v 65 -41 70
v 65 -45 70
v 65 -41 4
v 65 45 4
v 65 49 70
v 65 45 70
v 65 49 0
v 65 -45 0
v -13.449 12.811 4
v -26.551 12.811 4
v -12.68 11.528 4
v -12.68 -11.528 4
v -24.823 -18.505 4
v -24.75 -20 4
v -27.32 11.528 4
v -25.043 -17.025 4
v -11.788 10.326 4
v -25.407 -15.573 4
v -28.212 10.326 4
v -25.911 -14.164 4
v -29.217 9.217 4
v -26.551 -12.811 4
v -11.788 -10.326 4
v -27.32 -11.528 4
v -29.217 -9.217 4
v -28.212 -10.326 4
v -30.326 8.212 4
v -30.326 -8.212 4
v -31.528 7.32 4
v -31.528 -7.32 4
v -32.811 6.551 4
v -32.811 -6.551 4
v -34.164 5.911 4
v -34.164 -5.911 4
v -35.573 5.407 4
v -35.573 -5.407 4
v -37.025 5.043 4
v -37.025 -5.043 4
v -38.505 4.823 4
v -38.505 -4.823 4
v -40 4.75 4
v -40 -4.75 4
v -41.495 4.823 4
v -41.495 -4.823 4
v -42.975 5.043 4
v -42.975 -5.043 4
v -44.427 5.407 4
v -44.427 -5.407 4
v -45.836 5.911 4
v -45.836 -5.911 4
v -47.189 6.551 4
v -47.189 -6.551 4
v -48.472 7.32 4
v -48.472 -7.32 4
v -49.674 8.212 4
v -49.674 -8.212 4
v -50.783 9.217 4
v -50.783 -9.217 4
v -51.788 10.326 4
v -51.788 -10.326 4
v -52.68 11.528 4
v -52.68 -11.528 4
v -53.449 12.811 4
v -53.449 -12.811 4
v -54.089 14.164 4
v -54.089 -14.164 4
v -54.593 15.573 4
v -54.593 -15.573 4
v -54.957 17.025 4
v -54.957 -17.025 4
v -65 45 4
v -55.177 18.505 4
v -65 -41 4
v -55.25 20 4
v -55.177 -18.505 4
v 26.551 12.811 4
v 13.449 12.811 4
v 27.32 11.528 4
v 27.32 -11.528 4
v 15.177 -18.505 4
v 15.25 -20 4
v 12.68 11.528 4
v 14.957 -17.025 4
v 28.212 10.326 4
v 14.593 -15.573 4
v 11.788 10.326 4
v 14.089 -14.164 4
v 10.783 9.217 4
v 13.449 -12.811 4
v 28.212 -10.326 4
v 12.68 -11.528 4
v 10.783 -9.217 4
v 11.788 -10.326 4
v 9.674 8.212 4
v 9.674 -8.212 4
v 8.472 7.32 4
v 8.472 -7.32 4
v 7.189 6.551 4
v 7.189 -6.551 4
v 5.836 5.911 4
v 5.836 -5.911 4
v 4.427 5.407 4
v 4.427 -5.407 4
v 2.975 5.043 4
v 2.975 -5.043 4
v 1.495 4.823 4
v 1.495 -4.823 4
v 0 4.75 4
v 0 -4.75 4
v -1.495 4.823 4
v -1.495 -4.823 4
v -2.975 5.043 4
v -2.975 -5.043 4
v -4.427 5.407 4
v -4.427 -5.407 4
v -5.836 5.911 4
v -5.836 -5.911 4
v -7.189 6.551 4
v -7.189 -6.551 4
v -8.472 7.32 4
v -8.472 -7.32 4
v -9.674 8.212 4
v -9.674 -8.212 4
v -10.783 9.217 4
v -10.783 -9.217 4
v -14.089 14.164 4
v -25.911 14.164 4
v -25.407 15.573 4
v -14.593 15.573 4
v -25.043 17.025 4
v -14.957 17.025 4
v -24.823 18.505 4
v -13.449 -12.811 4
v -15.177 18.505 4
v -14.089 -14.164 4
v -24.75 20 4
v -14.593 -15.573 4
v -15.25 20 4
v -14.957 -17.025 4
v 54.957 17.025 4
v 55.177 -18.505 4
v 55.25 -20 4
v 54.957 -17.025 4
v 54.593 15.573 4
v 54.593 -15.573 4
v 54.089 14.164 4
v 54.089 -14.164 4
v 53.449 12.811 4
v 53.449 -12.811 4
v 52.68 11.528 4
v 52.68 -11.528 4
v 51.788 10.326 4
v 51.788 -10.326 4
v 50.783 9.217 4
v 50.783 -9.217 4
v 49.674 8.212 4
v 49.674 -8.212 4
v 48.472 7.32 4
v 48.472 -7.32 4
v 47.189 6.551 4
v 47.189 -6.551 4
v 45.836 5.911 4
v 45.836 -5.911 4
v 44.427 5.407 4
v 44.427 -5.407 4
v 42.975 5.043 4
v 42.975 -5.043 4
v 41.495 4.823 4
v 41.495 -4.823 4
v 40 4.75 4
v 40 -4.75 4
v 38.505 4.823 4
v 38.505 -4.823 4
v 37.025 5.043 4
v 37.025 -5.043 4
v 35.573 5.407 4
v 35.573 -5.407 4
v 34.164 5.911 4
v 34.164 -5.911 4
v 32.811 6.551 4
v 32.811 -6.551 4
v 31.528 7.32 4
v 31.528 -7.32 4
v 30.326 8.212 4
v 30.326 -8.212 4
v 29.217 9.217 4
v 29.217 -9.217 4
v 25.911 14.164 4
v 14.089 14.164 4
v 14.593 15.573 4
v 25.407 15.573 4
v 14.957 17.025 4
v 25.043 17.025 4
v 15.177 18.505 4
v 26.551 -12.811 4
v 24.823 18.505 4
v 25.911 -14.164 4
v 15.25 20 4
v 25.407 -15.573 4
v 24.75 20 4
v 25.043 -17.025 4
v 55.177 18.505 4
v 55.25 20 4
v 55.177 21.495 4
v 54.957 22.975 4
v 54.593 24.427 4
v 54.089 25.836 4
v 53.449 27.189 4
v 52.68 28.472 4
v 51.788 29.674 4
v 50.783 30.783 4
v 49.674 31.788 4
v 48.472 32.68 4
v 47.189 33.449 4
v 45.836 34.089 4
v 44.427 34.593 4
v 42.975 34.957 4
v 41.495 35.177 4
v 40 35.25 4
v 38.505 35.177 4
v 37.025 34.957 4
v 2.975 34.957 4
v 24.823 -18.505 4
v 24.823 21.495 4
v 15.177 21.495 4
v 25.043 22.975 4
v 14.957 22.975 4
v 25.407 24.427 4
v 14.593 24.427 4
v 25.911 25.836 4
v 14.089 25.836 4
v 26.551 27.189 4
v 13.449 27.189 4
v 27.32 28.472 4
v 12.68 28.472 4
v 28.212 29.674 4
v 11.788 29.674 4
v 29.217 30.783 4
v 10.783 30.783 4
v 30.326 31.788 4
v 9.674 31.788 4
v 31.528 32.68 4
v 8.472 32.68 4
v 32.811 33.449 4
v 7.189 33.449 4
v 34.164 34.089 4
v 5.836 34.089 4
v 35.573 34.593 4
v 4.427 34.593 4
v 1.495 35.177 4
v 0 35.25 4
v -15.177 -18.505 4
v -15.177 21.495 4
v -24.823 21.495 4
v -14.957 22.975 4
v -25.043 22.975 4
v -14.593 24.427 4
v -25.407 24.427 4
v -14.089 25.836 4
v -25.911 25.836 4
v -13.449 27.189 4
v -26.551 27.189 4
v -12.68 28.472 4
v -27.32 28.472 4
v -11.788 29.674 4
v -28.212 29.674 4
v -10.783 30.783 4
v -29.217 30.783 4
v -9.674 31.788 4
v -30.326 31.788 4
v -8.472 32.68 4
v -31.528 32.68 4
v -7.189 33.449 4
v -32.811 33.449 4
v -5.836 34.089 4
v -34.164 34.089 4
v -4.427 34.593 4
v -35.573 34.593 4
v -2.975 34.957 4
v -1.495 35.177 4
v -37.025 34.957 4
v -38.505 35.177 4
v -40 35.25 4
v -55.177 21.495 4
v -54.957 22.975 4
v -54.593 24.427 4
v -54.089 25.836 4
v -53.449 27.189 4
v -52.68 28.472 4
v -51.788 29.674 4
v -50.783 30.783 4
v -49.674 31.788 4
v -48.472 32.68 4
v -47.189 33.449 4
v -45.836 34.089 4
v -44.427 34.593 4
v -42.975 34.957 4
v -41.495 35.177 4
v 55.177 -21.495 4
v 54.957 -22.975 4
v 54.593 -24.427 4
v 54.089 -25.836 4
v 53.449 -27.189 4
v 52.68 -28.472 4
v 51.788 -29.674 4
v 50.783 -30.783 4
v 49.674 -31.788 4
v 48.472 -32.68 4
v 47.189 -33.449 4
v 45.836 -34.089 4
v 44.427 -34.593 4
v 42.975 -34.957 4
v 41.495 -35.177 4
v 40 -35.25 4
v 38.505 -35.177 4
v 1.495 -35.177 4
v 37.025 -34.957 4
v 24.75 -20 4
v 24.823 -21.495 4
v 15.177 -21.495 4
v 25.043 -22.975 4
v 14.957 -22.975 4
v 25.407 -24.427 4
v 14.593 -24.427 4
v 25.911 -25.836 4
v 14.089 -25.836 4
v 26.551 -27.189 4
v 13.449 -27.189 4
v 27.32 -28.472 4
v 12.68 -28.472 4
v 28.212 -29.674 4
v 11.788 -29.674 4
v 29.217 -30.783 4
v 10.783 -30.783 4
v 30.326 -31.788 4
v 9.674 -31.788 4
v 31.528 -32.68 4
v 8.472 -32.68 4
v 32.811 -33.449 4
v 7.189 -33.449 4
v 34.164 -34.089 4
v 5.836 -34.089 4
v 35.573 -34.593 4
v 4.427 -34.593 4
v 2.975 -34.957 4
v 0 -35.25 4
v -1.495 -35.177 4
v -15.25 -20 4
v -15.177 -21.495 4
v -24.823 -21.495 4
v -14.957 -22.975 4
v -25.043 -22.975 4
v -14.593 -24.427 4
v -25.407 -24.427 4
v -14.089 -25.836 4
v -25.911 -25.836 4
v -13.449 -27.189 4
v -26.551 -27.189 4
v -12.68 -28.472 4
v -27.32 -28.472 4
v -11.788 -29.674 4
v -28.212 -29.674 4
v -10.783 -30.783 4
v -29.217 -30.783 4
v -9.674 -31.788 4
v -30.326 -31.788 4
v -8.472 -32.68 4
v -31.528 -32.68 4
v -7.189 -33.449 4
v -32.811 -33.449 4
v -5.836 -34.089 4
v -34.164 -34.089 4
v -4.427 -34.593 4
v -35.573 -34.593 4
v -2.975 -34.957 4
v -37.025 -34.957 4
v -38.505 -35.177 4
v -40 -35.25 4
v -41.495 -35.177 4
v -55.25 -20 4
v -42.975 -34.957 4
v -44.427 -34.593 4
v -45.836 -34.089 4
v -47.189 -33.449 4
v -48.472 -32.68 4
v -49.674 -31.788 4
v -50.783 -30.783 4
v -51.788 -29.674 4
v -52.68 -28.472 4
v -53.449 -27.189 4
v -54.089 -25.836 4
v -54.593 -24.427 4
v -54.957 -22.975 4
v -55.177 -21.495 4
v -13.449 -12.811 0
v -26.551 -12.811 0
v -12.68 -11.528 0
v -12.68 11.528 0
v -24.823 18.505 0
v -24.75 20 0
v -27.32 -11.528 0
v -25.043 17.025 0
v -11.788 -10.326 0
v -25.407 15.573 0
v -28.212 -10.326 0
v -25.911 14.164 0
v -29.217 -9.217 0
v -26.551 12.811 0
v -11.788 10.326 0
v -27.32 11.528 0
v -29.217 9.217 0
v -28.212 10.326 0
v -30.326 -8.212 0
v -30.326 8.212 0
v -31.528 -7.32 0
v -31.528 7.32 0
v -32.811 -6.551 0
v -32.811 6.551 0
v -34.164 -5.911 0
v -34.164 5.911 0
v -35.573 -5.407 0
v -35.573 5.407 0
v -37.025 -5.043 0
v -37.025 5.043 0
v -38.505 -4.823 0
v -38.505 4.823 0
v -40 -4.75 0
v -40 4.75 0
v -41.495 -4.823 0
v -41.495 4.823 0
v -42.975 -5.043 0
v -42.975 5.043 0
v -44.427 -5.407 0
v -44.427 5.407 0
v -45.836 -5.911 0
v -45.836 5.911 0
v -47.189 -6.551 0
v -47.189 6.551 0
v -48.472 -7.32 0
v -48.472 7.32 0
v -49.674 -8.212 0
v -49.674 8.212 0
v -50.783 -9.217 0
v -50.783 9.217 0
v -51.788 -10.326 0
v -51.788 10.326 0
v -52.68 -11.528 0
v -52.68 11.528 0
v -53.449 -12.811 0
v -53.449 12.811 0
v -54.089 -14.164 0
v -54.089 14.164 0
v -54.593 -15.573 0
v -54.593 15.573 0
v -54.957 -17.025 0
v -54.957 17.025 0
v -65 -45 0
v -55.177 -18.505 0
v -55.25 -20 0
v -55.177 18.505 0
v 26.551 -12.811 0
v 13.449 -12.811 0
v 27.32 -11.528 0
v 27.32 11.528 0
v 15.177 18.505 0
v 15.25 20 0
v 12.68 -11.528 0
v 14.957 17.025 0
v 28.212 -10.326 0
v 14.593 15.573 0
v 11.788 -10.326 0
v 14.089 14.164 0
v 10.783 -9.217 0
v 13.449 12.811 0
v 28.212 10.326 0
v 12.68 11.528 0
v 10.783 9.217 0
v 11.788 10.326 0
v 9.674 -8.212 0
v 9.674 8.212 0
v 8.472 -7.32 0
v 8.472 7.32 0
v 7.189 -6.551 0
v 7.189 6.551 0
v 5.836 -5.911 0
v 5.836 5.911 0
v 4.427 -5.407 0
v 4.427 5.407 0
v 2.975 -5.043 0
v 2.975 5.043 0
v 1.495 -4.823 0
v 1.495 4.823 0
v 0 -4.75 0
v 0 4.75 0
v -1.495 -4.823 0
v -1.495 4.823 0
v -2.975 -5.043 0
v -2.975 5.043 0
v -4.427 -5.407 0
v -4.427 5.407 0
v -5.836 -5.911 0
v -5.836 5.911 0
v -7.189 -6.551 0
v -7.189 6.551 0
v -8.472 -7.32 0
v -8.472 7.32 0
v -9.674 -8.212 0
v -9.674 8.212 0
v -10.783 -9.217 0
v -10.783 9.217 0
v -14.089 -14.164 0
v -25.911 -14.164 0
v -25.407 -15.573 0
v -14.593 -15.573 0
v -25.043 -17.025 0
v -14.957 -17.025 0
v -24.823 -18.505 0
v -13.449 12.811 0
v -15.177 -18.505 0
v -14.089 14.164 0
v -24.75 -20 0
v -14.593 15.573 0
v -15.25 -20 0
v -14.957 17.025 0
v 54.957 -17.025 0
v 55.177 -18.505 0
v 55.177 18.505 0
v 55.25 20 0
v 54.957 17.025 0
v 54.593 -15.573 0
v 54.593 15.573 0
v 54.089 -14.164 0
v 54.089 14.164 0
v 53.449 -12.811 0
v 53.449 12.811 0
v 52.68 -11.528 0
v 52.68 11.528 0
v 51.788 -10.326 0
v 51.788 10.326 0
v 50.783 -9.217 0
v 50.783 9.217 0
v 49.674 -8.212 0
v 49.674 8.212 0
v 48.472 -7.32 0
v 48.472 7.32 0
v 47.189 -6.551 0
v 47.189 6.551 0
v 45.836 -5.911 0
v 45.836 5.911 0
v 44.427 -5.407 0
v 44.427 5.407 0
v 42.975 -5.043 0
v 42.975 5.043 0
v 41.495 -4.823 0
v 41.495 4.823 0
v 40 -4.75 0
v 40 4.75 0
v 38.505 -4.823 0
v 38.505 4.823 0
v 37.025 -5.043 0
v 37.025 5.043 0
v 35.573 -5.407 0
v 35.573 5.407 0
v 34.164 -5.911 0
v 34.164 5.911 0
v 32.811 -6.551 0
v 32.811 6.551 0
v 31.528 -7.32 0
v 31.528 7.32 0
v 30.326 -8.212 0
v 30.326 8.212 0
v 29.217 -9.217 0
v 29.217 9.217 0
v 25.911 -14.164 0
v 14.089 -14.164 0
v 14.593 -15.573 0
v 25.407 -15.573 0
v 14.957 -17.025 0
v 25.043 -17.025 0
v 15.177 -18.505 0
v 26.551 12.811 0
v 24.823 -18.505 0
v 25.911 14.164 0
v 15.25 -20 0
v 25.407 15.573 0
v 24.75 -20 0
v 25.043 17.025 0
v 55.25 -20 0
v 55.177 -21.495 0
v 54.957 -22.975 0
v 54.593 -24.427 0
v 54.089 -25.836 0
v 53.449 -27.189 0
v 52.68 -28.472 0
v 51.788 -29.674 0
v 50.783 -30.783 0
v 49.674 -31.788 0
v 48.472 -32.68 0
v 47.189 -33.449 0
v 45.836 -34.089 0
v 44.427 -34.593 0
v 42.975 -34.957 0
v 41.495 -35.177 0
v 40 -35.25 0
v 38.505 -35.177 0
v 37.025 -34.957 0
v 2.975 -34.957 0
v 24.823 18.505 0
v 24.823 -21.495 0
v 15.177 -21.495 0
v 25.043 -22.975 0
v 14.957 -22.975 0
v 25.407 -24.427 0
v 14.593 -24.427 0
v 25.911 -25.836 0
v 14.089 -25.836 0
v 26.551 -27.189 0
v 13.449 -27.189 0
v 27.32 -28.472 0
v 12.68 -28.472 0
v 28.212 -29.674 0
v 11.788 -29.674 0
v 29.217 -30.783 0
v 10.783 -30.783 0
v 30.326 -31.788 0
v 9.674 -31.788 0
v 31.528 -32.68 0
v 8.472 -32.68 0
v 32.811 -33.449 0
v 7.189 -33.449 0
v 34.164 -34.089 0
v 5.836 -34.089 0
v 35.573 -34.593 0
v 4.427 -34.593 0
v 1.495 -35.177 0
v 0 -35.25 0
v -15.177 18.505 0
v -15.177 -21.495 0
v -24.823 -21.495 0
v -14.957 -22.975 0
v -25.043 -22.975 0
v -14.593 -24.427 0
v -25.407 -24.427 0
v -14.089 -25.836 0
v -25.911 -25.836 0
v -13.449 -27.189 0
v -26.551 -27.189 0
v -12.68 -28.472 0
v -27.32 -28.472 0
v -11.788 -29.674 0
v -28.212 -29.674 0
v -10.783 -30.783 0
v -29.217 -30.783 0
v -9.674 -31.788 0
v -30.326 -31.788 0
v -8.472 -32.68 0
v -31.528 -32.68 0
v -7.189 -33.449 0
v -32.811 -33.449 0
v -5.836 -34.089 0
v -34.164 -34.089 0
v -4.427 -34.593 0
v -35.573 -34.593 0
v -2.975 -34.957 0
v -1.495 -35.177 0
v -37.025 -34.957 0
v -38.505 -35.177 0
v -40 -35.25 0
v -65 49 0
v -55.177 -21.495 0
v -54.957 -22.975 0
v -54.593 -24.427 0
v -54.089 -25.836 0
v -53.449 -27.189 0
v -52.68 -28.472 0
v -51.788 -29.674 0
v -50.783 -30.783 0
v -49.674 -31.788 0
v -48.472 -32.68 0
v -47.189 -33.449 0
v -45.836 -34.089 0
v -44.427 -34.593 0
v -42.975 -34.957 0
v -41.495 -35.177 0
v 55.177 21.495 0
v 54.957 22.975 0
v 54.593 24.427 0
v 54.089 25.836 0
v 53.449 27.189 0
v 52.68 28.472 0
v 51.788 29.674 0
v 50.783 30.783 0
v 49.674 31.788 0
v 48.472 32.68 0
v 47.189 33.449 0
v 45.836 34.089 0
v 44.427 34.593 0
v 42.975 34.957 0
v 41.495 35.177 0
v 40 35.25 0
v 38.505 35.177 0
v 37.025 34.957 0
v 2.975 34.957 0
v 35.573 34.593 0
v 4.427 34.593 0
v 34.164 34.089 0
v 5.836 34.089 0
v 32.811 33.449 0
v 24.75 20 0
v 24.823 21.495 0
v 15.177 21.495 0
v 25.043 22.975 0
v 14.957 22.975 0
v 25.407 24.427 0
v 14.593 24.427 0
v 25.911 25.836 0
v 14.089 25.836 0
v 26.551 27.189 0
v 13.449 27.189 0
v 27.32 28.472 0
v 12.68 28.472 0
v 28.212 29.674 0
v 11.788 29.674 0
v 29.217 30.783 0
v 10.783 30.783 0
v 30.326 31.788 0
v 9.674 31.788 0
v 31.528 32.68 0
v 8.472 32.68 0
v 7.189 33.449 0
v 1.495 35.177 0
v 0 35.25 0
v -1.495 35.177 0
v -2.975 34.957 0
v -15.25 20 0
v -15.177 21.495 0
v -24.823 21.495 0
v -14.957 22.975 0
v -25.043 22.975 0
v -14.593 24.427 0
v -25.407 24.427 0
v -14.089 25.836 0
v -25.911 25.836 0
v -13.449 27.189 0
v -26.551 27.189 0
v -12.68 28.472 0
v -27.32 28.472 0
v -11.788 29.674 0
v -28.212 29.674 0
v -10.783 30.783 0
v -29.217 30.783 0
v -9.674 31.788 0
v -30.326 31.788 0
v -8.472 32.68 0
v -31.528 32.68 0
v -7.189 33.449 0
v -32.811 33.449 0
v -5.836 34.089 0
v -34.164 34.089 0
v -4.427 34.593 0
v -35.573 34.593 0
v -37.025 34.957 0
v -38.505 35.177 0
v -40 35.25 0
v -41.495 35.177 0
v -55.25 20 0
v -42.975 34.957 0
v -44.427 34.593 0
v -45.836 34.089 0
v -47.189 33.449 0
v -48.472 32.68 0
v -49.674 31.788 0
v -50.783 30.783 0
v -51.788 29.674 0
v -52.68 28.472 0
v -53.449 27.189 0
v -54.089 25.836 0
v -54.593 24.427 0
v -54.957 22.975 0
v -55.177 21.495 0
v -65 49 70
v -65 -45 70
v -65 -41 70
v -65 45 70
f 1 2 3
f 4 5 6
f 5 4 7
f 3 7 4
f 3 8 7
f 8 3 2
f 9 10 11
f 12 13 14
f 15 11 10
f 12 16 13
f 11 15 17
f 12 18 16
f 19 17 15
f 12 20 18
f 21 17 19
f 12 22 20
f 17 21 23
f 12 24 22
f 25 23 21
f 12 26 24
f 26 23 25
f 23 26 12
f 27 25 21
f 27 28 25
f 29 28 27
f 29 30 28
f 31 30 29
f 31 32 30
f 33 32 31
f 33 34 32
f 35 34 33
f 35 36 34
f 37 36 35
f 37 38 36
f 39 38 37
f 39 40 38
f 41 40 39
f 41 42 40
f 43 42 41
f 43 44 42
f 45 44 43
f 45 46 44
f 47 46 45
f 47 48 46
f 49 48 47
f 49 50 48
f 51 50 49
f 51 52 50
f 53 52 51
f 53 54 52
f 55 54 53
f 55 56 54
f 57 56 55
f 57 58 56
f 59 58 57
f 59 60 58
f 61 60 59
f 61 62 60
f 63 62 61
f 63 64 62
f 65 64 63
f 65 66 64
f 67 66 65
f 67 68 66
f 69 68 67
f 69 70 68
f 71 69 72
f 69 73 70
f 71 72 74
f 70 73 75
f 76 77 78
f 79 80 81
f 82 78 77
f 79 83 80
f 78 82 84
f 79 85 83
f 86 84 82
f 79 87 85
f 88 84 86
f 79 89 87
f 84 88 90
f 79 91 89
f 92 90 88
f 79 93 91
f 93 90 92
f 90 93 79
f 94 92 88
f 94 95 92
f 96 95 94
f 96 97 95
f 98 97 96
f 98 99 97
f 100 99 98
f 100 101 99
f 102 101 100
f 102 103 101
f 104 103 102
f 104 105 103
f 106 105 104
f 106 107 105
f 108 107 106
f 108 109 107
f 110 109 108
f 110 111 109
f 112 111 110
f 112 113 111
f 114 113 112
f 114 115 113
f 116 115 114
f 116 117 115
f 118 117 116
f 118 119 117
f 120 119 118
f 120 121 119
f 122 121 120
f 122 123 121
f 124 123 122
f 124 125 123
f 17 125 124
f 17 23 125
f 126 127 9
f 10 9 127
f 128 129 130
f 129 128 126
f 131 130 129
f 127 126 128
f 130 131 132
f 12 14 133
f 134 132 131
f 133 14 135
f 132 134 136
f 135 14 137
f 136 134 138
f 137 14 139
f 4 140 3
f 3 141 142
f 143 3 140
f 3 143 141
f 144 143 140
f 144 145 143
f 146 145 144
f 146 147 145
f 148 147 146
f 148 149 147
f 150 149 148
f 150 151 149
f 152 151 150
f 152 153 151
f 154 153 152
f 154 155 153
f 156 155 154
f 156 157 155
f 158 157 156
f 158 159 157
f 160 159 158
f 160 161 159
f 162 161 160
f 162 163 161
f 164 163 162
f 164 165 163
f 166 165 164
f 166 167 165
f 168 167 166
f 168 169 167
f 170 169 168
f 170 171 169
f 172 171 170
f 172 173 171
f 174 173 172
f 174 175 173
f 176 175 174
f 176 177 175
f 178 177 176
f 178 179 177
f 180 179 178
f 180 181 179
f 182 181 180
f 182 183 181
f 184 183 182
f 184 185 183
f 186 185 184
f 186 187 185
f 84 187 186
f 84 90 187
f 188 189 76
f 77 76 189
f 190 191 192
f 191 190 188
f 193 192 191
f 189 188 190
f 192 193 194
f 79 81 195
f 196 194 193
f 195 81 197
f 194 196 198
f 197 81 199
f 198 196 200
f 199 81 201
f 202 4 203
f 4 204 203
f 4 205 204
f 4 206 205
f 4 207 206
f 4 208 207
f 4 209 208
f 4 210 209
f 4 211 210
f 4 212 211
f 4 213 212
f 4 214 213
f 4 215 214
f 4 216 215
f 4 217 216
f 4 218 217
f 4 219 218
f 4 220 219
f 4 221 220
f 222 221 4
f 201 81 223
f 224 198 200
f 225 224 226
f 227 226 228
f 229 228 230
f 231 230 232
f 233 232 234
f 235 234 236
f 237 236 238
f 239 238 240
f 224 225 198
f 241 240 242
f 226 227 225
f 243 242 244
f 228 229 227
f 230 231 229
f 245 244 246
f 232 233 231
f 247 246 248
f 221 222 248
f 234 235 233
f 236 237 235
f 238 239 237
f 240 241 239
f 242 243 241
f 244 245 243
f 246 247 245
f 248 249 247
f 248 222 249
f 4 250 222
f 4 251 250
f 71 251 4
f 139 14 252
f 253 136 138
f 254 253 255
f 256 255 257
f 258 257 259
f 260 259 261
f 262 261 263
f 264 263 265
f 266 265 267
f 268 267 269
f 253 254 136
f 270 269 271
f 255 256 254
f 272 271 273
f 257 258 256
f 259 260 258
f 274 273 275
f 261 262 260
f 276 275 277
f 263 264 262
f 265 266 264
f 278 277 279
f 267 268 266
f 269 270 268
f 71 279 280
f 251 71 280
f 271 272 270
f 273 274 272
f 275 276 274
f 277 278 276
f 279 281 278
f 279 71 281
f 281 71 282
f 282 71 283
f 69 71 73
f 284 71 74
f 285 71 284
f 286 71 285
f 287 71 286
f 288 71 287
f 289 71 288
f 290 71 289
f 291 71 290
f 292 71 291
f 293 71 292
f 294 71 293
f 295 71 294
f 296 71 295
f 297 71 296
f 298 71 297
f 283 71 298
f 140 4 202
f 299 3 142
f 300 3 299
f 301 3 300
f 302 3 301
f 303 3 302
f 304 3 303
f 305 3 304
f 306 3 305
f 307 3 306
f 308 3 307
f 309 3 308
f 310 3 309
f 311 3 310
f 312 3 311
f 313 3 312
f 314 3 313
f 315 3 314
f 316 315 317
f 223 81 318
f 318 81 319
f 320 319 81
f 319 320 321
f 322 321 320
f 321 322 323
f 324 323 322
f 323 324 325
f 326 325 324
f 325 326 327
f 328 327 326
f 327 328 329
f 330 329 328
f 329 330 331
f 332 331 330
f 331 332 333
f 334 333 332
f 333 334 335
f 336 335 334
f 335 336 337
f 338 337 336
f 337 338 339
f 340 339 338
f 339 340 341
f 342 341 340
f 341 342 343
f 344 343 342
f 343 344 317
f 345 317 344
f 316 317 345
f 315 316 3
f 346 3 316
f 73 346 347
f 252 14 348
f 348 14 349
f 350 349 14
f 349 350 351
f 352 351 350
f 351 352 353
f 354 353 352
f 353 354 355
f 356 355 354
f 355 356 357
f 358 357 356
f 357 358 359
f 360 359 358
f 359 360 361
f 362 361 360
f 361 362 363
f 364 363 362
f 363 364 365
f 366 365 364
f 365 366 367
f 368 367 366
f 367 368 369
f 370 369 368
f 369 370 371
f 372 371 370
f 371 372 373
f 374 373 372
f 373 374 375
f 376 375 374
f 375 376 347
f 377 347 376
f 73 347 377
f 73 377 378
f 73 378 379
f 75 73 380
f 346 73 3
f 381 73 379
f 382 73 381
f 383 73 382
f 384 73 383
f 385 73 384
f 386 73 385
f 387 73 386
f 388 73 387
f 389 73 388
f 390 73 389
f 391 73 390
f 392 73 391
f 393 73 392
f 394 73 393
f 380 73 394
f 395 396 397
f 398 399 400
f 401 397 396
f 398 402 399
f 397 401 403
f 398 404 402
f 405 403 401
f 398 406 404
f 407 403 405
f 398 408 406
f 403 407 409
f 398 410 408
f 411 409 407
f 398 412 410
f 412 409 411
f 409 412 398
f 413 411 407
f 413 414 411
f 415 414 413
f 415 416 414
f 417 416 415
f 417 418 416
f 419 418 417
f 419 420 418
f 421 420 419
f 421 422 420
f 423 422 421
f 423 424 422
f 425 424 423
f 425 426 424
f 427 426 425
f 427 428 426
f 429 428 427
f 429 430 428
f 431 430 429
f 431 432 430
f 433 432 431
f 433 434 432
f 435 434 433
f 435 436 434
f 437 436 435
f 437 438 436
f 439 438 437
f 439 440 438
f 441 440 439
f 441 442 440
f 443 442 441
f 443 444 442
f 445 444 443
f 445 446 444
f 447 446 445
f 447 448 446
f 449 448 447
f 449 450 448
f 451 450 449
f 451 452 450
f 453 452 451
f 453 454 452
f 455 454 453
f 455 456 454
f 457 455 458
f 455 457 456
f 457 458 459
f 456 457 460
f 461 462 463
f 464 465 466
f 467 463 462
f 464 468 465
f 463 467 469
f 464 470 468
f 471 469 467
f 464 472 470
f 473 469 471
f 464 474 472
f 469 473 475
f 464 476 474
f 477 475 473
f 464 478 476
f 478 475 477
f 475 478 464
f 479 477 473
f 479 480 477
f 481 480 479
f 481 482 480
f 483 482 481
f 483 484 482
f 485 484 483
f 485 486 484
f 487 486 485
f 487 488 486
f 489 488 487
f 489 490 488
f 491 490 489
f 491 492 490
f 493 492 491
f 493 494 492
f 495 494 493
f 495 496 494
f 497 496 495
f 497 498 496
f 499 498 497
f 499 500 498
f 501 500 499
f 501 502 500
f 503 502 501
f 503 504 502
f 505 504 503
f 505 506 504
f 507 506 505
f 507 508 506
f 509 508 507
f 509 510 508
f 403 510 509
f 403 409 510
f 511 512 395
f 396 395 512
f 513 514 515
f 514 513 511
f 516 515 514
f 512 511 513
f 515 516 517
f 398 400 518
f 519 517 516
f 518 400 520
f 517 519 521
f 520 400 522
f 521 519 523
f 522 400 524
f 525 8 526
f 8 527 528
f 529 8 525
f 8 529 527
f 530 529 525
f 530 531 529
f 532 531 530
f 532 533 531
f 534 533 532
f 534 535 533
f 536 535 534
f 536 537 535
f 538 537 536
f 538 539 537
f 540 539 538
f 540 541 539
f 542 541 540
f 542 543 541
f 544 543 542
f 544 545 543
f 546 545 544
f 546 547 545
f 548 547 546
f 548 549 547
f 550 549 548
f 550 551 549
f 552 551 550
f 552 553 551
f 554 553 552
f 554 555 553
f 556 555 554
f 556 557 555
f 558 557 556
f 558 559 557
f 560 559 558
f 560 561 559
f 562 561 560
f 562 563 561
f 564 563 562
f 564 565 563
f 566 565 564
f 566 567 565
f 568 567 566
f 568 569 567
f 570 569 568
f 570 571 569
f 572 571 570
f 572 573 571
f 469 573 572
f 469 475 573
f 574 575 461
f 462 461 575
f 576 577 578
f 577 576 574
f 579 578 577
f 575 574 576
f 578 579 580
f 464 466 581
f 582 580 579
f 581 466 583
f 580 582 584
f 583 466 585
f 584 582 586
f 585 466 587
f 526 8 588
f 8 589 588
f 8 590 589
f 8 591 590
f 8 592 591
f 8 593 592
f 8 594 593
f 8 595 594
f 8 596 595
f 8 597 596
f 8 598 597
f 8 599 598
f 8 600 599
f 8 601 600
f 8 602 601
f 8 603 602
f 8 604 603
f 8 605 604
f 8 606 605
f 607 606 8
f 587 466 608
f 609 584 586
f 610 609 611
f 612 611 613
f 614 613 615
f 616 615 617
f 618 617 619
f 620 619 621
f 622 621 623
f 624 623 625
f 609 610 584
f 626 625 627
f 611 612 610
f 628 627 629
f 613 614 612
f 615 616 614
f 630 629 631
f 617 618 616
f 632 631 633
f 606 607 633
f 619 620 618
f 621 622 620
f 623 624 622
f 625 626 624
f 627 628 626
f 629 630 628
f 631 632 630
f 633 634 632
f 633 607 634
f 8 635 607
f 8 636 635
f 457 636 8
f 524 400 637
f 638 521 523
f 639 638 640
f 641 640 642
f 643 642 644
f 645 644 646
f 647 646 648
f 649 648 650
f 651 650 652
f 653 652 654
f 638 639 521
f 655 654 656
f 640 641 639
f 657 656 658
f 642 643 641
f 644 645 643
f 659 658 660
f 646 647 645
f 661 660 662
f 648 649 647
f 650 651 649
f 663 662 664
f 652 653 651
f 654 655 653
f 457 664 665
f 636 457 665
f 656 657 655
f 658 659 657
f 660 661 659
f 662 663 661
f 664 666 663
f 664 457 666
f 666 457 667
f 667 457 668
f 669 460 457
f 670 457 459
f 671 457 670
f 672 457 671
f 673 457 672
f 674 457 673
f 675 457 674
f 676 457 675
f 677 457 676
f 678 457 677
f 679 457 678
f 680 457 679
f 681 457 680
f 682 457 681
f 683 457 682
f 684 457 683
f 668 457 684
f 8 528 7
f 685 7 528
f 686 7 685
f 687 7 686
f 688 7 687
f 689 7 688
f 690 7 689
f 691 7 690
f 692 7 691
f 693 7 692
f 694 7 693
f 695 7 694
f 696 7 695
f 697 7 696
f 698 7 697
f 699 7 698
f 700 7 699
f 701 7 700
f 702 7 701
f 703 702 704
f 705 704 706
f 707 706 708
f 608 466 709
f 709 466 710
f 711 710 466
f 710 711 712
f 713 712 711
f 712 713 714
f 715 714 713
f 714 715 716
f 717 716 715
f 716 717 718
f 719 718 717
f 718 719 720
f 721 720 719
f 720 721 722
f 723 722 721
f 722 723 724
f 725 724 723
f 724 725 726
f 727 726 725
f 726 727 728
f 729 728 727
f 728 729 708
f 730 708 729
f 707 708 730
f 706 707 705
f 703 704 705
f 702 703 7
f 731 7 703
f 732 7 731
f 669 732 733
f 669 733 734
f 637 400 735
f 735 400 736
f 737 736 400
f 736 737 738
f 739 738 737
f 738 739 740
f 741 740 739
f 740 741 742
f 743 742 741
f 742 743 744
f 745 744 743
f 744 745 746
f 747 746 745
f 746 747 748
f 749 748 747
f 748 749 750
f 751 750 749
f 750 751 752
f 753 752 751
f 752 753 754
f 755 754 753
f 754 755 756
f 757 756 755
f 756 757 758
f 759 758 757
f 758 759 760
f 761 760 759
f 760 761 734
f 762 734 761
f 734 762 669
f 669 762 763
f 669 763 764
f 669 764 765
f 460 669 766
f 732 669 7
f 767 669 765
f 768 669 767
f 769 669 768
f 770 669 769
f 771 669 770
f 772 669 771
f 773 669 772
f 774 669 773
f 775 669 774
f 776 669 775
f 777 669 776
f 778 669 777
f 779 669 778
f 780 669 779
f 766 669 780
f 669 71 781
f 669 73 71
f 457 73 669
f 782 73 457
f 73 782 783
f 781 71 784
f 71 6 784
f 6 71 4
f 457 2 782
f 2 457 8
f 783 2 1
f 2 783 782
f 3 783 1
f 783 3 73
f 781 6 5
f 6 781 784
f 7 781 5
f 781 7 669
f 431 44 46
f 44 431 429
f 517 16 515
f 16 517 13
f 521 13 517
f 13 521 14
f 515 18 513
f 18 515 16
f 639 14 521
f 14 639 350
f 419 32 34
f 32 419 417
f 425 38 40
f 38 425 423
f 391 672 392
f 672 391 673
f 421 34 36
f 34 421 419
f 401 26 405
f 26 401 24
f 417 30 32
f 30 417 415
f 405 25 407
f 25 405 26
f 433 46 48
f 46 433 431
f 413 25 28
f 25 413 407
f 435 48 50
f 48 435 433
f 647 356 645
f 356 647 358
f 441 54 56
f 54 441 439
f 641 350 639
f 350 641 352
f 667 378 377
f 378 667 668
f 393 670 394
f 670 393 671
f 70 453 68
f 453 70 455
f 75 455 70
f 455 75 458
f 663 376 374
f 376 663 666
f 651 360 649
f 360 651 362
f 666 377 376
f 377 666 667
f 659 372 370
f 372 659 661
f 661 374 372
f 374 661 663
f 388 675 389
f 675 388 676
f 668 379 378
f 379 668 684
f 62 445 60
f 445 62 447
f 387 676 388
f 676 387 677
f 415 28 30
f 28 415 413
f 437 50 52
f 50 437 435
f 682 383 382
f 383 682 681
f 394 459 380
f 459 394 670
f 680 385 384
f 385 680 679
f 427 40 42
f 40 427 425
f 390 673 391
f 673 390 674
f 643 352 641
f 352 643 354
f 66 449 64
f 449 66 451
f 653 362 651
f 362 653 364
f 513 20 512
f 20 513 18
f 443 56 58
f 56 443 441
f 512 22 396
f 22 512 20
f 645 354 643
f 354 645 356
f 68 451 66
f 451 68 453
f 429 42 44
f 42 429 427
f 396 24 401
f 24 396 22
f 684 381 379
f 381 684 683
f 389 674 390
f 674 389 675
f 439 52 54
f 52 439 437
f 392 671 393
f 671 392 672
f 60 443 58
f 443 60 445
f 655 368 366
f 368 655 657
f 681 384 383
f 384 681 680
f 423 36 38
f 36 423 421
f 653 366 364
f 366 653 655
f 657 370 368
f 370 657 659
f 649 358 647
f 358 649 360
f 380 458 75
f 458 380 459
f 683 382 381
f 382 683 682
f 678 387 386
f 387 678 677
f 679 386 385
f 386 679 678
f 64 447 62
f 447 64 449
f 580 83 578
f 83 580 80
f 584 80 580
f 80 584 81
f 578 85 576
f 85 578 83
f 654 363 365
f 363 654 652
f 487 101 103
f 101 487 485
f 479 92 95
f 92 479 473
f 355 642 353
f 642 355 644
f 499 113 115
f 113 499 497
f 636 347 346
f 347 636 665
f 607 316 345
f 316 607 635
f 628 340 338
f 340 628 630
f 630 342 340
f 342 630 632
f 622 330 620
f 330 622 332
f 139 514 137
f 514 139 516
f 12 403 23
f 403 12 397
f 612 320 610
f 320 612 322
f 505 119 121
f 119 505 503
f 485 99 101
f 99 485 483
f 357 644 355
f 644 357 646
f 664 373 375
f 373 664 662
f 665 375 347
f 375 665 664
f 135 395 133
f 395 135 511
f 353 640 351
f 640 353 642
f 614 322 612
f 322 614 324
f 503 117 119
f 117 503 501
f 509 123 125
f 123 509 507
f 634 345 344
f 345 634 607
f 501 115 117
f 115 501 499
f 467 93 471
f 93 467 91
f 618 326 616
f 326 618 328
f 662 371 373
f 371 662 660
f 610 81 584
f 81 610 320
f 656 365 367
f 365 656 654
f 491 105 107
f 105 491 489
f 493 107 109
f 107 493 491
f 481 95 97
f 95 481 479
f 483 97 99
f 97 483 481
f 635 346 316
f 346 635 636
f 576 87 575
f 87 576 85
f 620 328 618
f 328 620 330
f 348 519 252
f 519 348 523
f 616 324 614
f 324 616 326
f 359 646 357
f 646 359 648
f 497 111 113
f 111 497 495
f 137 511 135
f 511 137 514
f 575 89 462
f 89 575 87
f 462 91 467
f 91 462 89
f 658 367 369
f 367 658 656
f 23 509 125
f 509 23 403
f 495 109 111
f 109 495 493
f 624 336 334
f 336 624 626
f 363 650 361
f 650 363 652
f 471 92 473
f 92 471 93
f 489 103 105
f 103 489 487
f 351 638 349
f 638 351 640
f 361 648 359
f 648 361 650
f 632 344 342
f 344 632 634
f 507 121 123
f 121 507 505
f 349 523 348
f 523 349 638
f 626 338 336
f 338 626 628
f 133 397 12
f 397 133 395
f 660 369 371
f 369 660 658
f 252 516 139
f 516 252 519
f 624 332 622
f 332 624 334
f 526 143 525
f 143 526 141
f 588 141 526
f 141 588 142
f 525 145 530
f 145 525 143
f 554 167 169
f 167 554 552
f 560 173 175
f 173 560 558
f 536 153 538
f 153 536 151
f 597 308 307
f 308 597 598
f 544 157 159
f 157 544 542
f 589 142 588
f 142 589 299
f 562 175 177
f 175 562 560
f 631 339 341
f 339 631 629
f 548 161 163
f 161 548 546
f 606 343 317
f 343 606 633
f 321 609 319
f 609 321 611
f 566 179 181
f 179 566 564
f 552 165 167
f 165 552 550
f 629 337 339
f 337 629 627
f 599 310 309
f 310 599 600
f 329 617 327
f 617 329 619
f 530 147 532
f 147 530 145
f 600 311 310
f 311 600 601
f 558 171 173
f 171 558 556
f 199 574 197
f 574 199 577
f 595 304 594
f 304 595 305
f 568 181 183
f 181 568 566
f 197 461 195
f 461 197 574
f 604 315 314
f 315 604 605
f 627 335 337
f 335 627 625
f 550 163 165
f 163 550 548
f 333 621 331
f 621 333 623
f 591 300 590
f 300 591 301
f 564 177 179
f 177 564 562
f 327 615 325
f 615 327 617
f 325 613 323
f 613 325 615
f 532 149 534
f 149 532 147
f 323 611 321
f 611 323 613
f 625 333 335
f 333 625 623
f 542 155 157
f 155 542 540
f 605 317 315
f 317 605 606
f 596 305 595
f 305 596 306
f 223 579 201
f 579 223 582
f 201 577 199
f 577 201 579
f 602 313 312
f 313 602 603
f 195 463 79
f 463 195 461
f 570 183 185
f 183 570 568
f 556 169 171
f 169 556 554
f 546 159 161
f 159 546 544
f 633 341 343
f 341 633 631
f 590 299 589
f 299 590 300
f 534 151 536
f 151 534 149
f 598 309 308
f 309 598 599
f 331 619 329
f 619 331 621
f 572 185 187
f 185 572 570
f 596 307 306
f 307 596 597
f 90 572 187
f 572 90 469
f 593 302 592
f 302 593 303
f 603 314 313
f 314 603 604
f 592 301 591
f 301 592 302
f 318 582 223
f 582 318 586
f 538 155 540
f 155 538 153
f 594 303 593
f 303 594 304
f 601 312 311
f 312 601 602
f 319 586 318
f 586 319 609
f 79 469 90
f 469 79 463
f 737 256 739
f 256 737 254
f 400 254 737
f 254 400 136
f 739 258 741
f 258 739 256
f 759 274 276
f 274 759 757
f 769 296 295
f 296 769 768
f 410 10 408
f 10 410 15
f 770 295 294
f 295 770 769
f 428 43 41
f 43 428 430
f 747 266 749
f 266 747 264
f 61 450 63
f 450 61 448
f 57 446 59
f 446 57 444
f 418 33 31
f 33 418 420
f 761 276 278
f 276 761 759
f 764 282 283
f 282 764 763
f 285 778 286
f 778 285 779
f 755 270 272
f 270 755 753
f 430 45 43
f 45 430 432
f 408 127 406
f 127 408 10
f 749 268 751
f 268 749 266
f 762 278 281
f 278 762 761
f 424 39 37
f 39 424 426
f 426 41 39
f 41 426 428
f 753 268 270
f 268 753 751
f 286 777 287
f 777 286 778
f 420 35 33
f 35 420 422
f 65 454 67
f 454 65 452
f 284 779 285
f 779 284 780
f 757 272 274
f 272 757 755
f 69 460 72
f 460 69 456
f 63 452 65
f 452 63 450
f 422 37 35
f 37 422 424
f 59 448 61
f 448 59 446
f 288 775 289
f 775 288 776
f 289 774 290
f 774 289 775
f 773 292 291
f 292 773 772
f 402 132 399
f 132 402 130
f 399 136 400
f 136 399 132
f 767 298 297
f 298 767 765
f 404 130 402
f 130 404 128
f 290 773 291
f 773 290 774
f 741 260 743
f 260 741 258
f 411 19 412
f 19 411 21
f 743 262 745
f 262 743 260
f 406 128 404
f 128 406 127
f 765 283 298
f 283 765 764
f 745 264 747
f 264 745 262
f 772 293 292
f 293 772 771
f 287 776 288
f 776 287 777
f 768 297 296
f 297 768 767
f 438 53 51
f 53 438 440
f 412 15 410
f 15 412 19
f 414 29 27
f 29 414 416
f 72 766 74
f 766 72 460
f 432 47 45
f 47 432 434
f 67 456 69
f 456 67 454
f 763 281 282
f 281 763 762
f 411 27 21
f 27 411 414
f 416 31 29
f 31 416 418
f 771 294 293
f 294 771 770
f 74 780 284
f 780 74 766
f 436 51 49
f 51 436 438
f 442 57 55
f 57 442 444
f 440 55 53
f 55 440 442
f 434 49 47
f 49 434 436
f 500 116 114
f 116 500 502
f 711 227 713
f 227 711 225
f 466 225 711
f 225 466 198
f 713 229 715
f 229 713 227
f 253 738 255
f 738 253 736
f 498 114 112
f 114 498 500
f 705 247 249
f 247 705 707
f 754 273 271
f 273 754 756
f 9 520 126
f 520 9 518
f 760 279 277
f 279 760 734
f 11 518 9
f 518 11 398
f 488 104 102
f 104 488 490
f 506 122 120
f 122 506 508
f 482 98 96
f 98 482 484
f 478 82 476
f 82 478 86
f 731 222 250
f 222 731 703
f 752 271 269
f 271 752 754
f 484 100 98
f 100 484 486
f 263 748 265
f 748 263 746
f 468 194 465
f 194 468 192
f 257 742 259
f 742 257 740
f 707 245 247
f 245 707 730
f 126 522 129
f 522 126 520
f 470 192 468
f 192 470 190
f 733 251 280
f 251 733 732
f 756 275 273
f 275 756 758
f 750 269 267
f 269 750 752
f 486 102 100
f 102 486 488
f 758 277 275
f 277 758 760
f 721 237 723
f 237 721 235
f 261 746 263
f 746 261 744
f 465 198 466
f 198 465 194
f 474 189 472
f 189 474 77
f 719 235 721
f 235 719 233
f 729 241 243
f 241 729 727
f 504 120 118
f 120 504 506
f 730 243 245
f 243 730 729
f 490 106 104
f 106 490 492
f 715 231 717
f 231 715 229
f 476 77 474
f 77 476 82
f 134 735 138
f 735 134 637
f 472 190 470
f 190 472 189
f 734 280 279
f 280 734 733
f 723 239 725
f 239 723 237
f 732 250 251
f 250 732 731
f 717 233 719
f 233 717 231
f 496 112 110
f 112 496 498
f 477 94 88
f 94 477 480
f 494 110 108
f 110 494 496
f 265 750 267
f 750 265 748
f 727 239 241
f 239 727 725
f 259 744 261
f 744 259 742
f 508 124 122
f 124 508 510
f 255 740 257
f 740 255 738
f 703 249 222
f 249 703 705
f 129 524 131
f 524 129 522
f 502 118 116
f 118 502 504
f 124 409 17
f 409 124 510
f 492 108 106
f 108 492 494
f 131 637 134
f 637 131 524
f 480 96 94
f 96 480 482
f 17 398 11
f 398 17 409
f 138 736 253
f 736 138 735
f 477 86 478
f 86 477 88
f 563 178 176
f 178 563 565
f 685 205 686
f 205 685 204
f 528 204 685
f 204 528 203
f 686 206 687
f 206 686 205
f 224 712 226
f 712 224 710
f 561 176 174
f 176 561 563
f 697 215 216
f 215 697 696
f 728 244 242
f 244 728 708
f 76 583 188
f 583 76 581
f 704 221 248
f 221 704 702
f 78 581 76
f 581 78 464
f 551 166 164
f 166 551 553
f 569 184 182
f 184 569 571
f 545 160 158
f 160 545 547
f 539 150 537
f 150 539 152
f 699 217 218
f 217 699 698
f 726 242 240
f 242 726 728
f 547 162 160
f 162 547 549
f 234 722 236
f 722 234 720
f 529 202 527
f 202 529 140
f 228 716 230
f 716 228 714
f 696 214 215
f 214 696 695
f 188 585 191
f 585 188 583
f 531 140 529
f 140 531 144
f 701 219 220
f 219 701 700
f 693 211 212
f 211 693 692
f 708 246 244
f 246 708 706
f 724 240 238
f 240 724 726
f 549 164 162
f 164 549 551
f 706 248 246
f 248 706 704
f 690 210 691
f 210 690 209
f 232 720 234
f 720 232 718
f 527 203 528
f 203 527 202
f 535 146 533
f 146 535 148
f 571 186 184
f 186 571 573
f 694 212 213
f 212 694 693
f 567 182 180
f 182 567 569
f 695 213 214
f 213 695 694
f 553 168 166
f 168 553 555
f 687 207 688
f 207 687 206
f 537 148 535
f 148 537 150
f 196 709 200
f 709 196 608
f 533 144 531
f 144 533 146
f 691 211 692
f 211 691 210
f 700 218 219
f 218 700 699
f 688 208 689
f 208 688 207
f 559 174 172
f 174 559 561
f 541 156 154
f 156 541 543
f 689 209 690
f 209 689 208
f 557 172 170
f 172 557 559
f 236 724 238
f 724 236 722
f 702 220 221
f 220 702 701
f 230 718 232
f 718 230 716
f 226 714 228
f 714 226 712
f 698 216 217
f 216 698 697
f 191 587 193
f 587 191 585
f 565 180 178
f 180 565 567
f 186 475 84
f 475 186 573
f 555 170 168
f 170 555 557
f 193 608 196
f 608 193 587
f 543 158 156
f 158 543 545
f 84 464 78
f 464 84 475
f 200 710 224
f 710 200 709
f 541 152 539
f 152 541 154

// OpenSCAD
// Rack for six 50 mL conical (Falcon-type) tubes.
// Print orientation: Flat plate on bed (z=0), walls rising to z=70.
// After printing, flip over so walls are on the bed and tubes hang down.

// Plate dimensions
L     = 130; // Length (X)
W     = 90;  // Width (Y)
t_plate = 4; // Plate thickness (Z)

// Tube hole dimensions
n_rows = 2; // Rows along Y
n_cols = 3; // Columns along X
d_hole = 30.5; // Hole diameter
p_x = 40; // Centre-to-centre spacing X
p_y = 40; // Centre-to-centre spacing Y

// Wall dimensions
wall_h = 70; // Wall height (Z)
wall_t = 4;  // Wall thickness (Y)

// Geometry calculations
// Plate is centred on origin, so edges are at +/- L/2 and +/- W/2.
// Holes are centred on plate.
// Rows are along Y, Columns along X.
// Spacing is 40mm. With 2 rows, distance from centre is 20mm.
// With 3 cols, positions are -40, 0, +40.

$fn = 64;

// Calculate hole positions manually to avoid list comprehension syntax errors
// X positions: -40, 0, 40
hole_x_0 = -40;
hole_x_1 = 0;
hole_x_2 = 40;

// Y positions: -20, 20
hole_y_0 = -20;
hole_y_1 = 20;

difference() {
    union() {
        // 1. The flat base plate
        translate([-L / 2, -W / 2, 0]) cube([L, W, t_plate]);

        // 2. Two solid walls along the long edges (X axis)
        // Left wall at Y = -W/2
        translate([-L / 2, -W / 2, 0]) cube([L, wall_t, wall_h]);
        // Right wall at Y = +W/2
        translate([-L / 2, W / 2, 0]) cube([L, wall_t, wall_h]);
    }

    // Cut the holes
    for (y = [hole_y_0, hole_y_1]) {
        for (x = [hole_x_0, hole_x_1, hole_x_2]) {
            translate([x, y, 0]) cylinder(h = t_plate + 1, d = d_hole);
        }
    }
}
